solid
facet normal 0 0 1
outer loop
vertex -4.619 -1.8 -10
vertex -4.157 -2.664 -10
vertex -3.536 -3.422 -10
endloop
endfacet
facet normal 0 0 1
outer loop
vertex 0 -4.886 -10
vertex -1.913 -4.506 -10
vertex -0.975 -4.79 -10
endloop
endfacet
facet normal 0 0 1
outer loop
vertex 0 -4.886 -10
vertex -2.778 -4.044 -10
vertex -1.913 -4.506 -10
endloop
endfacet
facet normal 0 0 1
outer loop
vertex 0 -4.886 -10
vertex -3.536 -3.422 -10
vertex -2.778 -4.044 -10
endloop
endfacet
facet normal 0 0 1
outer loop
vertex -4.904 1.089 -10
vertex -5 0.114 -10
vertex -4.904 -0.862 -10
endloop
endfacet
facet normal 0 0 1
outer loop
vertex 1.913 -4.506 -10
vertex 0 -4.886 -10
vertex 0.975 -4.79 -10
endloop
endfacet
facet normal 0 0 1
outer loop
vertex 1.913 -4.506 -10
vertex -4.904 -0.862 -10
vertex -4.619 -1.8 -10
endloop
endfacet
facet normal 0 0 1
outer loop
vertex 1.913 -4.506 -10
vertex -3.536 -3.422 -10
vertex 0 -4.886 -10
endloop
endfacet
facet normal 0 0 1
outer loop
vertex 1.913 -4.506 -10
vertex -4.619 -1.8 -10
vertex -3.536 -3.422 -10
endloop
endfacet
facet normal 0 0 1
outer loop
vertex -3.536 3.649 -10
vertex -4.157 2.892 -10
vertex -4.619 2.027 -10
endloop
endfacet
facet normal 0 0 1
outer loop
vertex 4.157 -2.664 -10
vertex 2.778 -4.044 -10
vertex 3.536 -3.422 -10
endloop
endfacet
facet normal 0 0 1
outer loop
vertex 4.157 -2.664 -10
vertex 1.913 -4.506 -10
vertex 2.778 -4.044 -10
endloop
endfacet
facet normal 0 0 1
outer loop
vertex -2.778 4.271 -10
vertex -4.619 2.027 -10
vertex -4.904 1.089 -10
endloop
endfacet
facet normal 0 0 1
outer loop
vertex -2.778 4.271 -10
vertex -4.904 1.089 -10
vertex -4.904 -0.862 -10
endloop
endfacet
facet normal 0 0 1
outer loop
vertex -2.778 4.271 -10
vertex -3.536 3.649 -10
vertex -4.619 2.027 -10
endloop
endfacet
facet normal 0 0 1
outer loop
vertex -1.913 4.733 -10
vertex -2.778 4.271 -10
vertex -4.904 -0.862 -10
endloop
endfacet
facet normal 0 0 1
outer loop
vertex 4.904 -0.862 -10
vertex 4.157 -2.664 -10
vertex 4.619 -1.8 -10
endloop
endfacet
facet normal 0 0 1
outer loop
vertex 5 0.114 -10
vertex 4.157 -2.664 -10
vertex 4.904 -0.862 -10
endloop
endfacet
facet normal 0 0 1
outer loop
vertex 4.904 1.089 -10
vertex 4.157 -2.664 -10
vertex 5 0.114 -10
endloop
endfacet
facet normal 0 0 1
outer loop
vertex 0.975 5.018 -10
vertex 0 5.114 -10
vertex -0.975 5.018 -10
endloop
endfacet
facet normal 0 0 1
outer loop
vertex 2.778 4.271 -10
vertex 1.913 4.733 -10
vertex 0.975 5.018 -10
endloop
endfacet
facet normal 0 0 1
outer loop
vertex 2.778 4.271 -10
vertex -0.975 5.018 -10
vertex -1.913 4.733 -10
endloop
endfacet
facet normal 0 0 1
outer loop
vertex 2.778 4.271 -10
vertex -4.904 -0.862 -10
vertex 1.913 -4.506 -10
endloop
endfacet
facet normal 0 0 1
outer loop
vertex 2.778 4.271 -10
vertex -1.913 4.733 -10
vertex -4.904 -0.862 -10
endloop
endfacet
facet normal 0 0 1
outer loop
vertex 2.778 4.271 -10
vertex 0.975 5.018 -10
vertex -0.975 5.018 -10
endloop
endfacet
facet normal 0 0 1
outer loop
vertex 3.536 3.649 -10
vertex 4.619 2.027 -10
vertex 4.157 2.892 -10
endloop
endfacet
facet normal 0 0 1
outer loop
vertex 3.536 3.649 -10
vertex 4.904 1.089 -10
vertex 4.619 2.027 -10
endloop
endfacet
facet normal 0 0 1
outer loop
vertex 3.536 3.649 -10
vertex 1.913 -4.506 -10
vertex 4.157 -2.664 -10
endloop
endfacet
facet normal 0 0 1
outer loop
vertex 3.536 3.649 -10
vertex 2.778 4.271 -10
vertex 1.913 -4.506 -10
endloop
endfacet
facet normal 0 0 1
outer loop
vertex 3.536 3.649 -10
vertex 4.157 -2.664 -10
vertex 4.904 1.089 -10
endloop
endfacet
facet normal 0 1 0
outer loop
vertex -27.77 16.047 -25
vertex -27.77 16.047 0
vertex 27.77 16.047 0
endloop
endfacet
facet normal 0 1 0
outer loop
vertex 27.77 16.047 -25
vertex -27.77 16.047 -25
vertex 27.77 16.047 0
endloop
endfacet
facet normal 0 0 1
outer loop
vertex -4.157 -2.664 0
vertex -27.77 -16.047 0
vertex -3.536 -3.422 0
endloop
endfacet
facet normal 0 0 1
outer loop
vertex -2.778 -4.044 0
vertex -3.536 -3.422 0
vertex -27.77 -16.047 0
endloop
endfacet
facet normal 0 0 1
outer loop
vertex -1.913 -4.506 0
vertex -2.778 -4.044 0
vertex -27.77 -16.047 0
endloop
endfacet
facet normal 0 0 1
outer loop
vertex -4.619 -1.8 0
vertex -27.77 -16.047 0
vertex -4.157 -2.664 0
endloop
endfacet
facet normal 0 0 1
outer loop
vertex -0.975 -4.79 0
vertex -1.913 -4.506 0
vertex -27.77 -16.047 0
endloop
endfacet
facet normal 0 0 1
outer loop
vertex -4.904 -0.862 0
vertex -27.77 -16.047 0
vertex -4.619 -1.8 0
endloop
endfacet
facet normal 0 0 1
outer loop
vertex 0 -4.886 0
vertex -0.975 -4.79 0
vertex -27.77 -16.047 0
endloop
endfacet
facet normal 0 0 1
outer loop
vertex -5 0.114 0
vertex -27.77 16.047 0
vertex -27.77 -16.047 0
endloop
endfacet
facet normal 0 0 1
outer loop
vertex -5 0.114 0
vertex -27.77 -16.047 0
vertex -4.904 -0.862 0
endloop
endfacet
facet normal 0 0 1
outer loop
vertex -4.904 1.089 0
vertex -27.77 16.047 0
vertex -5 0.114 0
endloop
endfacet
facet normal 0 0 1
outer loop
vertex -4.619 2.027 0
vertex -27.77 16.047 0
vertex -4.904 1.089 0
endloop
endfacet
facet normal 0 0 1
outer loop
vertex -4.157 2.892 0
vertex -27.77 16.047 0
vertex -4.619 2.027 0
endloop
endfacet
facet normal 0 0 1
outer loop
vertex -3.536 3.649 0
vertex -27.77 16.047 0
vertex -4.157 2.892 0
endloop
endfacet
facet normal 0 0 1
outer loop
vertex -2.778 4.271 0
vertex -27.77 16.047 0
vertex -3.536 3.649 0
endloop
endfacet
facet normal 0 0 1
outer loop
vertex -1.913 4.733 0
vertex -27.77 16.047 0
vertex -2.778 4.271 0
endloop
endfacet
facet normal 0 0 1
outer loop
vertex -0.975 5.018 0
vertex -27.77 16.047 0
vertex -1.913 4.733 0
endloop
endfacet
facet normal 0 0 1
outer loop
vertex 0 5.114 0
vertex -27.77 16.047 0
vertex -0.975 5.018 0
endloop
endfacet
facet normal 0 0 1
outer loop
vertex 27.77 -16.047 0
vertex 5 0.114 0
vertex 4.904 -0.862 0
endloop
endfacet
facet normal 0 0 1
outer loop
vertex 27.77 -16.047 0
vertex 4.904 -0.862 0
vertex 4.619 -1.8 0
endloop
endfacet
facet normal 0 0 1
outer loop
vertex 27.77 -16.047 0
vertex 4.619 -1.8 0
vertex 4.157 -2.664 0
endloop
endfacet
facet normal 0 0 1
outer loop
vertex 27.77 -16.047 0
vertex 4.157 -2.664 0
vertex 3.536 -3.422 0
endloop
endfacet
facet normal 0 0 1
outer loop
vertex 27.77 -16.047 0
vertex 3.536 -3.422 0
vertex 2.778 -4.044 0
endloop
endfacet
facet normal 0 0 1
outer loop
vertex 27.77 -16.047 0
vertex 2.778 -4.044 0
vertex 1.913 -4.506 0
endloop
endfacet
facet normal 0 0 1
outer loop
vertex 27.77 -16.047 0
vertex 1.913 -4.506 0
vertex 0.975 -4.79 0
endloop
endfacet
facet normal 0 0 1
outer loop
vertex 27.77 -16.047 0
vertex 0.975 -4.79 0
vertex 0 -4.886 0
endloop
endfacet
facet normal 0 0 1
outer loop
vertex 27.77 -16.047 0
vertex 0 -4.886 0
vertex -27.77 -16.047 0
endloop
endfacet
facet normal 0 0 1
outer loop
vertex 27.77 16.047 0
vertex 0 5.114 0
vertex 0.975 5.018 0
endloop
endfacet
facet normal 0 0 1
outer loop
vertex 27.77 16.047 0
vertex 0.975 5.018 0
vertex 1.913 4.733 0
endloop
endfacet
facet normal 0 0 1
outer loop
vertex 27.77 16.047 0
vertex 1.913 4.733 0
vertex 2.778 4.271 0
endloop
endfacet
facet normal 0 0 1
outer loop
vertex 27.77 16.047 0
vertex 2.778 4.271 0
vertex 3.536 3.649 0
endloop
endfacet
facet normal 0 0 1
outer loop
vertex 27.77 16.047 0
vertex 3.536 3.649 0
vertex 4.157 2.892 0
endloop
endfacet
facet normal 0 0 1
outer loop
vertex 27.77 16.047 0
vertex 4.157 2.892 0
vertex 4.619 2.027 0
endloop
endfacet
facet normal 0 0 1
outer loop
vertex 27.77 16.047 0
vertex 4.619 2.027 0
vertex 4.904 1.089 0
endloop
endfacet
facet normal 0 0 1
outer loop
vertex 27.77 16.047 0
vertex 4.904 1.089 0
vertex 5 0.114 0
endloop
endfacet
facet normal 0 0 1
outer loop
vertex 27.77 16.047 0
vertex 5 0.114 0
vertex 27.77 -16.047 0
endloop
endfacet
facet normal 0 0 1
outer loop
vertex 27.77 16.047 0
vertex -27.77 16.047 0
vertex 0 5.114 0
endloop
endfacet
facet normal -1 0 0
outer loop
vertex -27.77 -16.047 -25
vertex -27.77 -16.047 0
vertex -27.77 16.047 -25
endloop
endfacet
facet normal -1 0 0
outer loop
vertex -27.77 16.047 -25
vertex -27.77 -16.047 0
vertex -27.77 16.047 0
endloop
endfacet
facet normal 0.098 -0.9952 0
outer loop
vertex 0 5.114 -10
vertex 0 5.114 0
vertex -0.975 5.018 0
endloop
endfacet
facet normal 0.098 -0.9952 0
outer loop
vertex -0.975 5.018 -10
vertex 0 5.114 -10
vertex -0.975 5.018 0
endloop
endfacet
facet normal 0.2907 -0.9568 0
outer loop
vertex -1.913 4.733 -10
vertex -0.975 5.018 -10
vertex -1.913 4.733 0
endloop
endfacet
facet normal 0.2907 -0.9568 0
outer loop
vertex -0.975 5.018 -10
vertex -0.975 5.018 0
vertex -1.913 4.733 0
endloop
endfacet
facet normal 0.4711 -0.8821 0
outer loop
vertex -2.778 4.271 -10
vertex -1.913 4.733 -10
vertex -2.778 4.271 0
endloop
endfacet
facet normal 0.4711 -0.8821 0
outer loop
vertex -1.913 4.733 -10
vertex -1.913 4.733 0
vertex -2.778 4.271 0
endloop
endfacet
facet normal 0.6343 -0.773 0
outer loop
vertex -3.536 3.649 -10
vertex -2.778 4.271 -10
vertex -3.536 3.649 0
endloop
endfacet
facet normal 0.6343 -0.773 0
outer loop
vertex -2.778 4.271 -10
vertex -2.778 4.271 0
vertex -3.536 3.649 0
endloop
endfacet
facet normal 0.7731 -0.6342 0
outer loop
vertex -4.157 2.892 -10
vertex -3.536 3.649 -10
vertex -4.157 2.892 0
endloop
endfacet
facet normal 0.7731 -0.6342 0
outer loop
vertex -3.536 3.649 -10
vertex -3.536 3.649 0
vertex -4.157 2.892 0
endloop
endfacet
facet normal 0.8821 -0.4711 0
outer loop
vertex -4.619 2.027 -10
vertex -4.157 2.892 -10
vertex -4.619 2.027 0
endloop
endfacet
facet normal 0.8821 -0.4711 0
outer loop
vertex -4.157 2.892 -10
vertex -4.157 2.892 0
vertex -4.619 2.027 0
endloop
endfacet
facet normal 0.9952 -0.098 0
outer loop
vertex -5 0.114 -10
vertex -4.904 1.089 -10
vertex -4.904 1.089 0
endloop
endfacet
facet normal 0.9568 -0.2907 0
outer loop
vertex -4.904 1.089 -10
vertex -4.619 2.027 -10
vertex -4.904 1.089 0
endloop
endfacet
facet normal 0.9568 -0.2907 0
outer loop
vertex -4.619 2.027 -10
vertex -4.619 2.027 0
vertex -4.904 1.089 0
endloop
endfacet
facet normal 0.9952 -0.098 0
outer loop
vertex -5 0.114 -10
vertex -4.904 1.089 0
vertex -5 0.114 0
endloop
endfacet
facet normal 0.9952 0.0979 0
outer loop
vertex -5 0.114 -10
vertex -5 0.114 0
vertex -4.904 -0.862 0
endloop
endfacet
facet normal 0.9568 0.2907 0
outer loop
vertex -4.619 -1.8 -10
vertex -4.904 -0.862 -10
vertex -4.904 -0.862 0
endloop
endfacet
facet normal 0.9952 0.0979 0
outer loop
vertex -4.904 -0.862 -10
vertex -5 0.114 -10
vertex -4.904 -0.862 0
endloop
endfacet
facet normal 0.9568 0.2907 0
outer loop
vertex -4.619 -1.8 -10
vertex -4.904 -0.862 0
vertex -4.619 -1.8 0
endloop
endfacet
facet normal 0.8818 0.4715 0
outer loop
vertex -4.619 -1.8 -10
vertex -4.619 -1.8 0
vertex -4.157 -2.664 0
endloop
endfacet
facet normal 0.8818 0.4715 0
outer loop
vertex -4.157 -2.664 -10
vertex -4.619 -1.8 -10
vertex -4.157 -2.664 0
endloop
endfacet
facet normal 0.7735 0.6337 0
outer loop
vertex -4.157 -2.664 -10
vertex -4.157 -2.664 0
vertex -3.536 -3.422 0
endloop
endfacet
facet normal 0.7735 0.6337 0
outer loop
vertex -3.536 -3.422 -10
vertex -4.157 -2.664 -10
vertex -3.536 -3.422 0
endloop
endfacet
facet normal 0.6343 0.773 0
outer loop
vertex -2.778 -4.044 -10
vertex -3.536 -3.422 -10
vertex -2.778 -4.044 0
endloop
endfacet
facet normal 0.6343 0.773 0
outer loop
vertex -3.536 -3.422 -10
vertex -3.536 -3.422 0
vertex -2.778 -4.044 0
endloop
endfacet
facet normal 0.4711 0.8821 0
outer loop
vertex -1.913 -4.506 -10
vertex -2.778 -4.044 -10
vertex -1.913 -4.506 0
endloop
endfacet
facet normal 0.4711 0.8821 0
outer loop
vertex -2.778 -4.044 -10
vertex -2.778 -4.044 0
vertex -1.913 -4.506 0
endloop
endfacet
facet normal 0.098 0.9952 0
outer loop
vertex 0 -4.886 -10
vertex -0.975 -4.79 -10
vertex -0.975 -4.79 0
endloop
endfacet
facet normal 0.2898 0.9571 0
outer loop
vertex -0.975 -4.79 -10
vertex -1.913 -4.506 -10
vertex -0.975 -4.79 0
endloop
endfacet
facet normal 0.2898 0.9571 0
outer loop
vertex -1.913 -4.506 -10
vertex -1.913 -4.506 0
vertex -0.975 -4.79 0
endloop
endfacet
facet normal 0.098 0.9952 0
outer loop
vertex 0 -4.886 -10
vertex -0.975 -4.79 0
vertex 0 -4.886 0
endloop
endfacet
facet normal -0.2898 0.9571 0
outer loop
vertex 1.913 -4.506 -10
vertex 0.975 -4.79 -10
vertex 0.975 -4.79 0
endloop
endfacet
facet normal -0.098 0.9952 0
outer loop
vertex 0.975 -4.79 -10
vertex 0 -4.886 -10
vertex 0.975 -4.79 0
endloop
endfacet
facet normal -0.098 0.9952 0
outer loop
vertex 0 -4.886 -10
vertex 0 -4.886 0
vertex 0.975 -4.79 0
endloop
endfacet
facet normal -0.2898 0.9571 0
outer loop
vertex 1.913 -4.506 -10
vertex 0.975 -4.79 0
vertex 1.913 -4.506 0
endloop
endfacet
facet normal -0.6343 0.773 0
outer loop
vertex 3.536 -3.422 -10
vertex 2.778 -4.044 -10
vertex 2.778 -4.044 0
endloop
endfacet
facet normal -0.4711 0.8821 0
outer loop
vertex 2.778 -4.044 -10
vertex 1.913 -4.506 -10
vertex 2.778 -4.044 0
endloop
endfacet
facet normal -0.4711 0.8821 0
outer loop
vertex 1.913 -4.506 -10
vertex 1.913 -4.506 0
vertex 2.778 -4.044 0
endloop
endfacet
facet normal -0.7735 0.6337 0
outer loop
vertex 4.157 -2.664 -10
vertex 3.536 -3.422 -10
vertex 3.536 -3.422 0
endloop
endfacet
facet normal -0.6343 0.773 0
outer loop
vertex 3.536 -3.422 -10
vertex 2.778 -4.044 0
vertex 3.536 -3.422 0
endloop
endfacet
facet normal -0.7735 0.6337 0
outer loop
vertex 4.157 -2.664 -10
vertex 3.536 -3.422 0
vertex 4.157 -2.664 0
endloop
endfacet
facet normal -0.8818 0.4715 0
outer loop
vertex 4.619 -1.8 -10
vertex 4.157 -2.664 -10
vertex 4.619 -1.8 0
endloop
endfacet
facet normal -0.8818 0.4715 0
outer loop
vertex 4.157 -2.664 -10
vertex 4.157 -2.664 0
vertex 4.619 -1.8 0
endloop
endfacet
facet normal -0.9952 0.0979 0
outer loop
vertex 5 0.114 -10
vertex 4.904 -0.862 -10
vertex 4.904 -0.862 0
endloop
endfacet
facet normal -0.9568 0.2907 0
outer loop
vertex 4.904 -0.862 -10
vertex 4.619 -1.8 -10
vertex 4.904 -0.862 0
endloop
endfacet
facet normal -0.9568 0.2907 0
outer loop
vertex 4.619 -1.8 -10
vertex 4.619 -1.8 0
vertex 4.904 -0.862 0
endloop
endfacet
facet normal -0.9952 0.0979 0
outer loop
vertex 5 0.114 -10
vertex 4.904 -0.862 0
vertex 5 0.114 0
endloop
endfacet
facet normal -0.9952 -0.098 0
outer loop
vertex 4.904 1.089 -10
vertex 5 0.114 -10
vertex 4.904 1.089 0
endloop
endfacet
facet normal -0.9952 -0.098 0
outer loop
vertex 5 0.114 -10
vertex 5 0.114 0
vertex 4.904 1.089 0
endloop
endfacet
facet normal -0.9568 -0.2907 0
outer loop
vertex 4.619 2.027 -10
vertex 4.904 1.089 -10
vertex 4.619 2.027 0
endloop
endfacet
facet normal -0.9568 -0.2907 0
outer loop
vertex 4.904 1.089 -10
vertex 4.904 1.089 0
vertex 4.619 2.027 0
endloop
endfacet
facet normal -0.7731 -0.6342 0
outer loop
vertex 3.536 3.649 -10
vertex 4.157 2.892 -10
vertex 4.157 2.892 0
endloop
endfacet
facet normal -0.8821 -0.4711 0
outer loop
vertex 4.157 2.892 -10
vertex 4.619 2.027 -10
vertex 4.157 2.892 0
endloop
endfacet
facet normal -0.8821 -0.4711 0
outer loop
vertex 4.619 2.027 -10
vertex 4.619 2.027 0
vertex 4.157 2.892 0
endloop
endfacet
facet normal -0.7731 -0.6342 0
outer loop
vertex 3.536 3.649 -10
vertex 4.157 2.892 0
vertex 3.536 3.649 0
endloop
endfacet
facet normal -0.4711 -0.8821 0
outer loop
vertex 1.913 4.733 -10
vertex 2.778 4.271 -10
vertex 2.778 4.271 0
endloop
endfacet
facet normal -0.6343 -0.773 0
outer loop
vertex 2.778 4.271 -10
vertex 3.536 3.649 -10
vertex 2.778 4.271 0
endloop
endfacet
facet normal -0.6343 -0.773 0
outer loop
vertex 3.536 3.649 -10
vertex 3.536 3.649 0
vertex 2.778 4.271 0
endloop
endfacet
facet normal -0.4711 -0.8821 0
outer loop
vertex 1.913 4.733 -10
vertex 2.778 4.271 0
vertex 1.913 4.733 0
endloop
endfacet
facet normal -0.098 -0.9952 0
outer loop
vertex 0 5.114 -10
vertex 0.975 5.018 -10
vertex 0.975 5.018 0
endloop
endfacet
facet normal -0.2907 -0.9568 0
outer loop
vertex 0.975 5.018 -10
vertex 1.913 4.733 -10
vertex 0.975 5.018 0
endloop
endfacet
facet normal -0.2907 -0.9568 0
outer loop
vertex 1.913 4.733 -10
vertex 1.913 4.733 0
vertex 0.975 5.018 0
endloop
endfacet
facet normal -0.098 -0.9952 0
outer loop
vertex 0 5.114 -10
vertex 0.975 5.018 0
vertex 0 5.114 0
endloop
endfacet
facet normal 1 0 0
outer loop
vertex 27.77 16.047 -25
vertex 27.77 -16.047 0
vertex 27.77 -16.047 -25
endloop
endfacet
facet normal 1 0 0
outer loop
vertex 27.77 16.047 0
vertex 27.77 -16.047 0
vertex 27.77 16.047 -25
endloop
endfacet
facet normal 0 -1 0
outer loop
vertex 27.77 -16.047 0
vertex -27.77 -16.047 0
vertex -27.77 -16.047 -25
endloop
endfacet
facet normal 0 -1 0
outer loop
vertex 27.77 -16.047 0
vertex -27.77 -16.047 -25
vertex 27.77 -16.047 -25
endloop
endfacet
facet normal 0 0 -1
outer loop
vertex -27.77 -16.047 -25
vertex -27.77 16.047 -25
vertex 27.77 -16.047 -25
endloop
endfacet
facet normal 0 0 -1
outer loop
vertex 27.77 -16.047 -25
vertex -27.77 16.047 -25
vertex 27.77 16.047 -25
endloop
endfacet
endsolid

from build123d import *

# Parameters (mm, degrees)
F0_W     = 55.539488
F0_H     = 32.094934
F1_DEPTH = 25
F3_DEPTH = 10
F4_DEPTH = 10


with BuildPart() as f1:
    # F0 (on Top) → F1 (new body)
    with BuildSketch(Plane.XY):
        Rectangle(F0_W, F0_H)
    extrude(amount=-F1_DEPTH)

    # F2 (on face) → F3 (cut)
    with BuildSketch(Plane.XY):
        with BuildLine():
            ThreePointArc((0, 5.113803), (-5, 0.113803), (0, -4.886197))
            Line((0, -4.886197), (0, 5.113803))
        make_face()
    extrude(amount=-F3_DEPTH, mode=Mode.SUBTRACT)

    # F2 (on face) → F4 (cut)
    with BuildSketch(Plane.XY):
        with BuildLine():
            Line((0, 5.113803), (0, -4.886197))
            ThreePointArc((0, -4.886197), (5, 0.113803), (0, 5.113803))
        make_face()
    extrude(amount=-F4_DEPTH, mode=Mode.SUBTRACT)


solid = f1.part
